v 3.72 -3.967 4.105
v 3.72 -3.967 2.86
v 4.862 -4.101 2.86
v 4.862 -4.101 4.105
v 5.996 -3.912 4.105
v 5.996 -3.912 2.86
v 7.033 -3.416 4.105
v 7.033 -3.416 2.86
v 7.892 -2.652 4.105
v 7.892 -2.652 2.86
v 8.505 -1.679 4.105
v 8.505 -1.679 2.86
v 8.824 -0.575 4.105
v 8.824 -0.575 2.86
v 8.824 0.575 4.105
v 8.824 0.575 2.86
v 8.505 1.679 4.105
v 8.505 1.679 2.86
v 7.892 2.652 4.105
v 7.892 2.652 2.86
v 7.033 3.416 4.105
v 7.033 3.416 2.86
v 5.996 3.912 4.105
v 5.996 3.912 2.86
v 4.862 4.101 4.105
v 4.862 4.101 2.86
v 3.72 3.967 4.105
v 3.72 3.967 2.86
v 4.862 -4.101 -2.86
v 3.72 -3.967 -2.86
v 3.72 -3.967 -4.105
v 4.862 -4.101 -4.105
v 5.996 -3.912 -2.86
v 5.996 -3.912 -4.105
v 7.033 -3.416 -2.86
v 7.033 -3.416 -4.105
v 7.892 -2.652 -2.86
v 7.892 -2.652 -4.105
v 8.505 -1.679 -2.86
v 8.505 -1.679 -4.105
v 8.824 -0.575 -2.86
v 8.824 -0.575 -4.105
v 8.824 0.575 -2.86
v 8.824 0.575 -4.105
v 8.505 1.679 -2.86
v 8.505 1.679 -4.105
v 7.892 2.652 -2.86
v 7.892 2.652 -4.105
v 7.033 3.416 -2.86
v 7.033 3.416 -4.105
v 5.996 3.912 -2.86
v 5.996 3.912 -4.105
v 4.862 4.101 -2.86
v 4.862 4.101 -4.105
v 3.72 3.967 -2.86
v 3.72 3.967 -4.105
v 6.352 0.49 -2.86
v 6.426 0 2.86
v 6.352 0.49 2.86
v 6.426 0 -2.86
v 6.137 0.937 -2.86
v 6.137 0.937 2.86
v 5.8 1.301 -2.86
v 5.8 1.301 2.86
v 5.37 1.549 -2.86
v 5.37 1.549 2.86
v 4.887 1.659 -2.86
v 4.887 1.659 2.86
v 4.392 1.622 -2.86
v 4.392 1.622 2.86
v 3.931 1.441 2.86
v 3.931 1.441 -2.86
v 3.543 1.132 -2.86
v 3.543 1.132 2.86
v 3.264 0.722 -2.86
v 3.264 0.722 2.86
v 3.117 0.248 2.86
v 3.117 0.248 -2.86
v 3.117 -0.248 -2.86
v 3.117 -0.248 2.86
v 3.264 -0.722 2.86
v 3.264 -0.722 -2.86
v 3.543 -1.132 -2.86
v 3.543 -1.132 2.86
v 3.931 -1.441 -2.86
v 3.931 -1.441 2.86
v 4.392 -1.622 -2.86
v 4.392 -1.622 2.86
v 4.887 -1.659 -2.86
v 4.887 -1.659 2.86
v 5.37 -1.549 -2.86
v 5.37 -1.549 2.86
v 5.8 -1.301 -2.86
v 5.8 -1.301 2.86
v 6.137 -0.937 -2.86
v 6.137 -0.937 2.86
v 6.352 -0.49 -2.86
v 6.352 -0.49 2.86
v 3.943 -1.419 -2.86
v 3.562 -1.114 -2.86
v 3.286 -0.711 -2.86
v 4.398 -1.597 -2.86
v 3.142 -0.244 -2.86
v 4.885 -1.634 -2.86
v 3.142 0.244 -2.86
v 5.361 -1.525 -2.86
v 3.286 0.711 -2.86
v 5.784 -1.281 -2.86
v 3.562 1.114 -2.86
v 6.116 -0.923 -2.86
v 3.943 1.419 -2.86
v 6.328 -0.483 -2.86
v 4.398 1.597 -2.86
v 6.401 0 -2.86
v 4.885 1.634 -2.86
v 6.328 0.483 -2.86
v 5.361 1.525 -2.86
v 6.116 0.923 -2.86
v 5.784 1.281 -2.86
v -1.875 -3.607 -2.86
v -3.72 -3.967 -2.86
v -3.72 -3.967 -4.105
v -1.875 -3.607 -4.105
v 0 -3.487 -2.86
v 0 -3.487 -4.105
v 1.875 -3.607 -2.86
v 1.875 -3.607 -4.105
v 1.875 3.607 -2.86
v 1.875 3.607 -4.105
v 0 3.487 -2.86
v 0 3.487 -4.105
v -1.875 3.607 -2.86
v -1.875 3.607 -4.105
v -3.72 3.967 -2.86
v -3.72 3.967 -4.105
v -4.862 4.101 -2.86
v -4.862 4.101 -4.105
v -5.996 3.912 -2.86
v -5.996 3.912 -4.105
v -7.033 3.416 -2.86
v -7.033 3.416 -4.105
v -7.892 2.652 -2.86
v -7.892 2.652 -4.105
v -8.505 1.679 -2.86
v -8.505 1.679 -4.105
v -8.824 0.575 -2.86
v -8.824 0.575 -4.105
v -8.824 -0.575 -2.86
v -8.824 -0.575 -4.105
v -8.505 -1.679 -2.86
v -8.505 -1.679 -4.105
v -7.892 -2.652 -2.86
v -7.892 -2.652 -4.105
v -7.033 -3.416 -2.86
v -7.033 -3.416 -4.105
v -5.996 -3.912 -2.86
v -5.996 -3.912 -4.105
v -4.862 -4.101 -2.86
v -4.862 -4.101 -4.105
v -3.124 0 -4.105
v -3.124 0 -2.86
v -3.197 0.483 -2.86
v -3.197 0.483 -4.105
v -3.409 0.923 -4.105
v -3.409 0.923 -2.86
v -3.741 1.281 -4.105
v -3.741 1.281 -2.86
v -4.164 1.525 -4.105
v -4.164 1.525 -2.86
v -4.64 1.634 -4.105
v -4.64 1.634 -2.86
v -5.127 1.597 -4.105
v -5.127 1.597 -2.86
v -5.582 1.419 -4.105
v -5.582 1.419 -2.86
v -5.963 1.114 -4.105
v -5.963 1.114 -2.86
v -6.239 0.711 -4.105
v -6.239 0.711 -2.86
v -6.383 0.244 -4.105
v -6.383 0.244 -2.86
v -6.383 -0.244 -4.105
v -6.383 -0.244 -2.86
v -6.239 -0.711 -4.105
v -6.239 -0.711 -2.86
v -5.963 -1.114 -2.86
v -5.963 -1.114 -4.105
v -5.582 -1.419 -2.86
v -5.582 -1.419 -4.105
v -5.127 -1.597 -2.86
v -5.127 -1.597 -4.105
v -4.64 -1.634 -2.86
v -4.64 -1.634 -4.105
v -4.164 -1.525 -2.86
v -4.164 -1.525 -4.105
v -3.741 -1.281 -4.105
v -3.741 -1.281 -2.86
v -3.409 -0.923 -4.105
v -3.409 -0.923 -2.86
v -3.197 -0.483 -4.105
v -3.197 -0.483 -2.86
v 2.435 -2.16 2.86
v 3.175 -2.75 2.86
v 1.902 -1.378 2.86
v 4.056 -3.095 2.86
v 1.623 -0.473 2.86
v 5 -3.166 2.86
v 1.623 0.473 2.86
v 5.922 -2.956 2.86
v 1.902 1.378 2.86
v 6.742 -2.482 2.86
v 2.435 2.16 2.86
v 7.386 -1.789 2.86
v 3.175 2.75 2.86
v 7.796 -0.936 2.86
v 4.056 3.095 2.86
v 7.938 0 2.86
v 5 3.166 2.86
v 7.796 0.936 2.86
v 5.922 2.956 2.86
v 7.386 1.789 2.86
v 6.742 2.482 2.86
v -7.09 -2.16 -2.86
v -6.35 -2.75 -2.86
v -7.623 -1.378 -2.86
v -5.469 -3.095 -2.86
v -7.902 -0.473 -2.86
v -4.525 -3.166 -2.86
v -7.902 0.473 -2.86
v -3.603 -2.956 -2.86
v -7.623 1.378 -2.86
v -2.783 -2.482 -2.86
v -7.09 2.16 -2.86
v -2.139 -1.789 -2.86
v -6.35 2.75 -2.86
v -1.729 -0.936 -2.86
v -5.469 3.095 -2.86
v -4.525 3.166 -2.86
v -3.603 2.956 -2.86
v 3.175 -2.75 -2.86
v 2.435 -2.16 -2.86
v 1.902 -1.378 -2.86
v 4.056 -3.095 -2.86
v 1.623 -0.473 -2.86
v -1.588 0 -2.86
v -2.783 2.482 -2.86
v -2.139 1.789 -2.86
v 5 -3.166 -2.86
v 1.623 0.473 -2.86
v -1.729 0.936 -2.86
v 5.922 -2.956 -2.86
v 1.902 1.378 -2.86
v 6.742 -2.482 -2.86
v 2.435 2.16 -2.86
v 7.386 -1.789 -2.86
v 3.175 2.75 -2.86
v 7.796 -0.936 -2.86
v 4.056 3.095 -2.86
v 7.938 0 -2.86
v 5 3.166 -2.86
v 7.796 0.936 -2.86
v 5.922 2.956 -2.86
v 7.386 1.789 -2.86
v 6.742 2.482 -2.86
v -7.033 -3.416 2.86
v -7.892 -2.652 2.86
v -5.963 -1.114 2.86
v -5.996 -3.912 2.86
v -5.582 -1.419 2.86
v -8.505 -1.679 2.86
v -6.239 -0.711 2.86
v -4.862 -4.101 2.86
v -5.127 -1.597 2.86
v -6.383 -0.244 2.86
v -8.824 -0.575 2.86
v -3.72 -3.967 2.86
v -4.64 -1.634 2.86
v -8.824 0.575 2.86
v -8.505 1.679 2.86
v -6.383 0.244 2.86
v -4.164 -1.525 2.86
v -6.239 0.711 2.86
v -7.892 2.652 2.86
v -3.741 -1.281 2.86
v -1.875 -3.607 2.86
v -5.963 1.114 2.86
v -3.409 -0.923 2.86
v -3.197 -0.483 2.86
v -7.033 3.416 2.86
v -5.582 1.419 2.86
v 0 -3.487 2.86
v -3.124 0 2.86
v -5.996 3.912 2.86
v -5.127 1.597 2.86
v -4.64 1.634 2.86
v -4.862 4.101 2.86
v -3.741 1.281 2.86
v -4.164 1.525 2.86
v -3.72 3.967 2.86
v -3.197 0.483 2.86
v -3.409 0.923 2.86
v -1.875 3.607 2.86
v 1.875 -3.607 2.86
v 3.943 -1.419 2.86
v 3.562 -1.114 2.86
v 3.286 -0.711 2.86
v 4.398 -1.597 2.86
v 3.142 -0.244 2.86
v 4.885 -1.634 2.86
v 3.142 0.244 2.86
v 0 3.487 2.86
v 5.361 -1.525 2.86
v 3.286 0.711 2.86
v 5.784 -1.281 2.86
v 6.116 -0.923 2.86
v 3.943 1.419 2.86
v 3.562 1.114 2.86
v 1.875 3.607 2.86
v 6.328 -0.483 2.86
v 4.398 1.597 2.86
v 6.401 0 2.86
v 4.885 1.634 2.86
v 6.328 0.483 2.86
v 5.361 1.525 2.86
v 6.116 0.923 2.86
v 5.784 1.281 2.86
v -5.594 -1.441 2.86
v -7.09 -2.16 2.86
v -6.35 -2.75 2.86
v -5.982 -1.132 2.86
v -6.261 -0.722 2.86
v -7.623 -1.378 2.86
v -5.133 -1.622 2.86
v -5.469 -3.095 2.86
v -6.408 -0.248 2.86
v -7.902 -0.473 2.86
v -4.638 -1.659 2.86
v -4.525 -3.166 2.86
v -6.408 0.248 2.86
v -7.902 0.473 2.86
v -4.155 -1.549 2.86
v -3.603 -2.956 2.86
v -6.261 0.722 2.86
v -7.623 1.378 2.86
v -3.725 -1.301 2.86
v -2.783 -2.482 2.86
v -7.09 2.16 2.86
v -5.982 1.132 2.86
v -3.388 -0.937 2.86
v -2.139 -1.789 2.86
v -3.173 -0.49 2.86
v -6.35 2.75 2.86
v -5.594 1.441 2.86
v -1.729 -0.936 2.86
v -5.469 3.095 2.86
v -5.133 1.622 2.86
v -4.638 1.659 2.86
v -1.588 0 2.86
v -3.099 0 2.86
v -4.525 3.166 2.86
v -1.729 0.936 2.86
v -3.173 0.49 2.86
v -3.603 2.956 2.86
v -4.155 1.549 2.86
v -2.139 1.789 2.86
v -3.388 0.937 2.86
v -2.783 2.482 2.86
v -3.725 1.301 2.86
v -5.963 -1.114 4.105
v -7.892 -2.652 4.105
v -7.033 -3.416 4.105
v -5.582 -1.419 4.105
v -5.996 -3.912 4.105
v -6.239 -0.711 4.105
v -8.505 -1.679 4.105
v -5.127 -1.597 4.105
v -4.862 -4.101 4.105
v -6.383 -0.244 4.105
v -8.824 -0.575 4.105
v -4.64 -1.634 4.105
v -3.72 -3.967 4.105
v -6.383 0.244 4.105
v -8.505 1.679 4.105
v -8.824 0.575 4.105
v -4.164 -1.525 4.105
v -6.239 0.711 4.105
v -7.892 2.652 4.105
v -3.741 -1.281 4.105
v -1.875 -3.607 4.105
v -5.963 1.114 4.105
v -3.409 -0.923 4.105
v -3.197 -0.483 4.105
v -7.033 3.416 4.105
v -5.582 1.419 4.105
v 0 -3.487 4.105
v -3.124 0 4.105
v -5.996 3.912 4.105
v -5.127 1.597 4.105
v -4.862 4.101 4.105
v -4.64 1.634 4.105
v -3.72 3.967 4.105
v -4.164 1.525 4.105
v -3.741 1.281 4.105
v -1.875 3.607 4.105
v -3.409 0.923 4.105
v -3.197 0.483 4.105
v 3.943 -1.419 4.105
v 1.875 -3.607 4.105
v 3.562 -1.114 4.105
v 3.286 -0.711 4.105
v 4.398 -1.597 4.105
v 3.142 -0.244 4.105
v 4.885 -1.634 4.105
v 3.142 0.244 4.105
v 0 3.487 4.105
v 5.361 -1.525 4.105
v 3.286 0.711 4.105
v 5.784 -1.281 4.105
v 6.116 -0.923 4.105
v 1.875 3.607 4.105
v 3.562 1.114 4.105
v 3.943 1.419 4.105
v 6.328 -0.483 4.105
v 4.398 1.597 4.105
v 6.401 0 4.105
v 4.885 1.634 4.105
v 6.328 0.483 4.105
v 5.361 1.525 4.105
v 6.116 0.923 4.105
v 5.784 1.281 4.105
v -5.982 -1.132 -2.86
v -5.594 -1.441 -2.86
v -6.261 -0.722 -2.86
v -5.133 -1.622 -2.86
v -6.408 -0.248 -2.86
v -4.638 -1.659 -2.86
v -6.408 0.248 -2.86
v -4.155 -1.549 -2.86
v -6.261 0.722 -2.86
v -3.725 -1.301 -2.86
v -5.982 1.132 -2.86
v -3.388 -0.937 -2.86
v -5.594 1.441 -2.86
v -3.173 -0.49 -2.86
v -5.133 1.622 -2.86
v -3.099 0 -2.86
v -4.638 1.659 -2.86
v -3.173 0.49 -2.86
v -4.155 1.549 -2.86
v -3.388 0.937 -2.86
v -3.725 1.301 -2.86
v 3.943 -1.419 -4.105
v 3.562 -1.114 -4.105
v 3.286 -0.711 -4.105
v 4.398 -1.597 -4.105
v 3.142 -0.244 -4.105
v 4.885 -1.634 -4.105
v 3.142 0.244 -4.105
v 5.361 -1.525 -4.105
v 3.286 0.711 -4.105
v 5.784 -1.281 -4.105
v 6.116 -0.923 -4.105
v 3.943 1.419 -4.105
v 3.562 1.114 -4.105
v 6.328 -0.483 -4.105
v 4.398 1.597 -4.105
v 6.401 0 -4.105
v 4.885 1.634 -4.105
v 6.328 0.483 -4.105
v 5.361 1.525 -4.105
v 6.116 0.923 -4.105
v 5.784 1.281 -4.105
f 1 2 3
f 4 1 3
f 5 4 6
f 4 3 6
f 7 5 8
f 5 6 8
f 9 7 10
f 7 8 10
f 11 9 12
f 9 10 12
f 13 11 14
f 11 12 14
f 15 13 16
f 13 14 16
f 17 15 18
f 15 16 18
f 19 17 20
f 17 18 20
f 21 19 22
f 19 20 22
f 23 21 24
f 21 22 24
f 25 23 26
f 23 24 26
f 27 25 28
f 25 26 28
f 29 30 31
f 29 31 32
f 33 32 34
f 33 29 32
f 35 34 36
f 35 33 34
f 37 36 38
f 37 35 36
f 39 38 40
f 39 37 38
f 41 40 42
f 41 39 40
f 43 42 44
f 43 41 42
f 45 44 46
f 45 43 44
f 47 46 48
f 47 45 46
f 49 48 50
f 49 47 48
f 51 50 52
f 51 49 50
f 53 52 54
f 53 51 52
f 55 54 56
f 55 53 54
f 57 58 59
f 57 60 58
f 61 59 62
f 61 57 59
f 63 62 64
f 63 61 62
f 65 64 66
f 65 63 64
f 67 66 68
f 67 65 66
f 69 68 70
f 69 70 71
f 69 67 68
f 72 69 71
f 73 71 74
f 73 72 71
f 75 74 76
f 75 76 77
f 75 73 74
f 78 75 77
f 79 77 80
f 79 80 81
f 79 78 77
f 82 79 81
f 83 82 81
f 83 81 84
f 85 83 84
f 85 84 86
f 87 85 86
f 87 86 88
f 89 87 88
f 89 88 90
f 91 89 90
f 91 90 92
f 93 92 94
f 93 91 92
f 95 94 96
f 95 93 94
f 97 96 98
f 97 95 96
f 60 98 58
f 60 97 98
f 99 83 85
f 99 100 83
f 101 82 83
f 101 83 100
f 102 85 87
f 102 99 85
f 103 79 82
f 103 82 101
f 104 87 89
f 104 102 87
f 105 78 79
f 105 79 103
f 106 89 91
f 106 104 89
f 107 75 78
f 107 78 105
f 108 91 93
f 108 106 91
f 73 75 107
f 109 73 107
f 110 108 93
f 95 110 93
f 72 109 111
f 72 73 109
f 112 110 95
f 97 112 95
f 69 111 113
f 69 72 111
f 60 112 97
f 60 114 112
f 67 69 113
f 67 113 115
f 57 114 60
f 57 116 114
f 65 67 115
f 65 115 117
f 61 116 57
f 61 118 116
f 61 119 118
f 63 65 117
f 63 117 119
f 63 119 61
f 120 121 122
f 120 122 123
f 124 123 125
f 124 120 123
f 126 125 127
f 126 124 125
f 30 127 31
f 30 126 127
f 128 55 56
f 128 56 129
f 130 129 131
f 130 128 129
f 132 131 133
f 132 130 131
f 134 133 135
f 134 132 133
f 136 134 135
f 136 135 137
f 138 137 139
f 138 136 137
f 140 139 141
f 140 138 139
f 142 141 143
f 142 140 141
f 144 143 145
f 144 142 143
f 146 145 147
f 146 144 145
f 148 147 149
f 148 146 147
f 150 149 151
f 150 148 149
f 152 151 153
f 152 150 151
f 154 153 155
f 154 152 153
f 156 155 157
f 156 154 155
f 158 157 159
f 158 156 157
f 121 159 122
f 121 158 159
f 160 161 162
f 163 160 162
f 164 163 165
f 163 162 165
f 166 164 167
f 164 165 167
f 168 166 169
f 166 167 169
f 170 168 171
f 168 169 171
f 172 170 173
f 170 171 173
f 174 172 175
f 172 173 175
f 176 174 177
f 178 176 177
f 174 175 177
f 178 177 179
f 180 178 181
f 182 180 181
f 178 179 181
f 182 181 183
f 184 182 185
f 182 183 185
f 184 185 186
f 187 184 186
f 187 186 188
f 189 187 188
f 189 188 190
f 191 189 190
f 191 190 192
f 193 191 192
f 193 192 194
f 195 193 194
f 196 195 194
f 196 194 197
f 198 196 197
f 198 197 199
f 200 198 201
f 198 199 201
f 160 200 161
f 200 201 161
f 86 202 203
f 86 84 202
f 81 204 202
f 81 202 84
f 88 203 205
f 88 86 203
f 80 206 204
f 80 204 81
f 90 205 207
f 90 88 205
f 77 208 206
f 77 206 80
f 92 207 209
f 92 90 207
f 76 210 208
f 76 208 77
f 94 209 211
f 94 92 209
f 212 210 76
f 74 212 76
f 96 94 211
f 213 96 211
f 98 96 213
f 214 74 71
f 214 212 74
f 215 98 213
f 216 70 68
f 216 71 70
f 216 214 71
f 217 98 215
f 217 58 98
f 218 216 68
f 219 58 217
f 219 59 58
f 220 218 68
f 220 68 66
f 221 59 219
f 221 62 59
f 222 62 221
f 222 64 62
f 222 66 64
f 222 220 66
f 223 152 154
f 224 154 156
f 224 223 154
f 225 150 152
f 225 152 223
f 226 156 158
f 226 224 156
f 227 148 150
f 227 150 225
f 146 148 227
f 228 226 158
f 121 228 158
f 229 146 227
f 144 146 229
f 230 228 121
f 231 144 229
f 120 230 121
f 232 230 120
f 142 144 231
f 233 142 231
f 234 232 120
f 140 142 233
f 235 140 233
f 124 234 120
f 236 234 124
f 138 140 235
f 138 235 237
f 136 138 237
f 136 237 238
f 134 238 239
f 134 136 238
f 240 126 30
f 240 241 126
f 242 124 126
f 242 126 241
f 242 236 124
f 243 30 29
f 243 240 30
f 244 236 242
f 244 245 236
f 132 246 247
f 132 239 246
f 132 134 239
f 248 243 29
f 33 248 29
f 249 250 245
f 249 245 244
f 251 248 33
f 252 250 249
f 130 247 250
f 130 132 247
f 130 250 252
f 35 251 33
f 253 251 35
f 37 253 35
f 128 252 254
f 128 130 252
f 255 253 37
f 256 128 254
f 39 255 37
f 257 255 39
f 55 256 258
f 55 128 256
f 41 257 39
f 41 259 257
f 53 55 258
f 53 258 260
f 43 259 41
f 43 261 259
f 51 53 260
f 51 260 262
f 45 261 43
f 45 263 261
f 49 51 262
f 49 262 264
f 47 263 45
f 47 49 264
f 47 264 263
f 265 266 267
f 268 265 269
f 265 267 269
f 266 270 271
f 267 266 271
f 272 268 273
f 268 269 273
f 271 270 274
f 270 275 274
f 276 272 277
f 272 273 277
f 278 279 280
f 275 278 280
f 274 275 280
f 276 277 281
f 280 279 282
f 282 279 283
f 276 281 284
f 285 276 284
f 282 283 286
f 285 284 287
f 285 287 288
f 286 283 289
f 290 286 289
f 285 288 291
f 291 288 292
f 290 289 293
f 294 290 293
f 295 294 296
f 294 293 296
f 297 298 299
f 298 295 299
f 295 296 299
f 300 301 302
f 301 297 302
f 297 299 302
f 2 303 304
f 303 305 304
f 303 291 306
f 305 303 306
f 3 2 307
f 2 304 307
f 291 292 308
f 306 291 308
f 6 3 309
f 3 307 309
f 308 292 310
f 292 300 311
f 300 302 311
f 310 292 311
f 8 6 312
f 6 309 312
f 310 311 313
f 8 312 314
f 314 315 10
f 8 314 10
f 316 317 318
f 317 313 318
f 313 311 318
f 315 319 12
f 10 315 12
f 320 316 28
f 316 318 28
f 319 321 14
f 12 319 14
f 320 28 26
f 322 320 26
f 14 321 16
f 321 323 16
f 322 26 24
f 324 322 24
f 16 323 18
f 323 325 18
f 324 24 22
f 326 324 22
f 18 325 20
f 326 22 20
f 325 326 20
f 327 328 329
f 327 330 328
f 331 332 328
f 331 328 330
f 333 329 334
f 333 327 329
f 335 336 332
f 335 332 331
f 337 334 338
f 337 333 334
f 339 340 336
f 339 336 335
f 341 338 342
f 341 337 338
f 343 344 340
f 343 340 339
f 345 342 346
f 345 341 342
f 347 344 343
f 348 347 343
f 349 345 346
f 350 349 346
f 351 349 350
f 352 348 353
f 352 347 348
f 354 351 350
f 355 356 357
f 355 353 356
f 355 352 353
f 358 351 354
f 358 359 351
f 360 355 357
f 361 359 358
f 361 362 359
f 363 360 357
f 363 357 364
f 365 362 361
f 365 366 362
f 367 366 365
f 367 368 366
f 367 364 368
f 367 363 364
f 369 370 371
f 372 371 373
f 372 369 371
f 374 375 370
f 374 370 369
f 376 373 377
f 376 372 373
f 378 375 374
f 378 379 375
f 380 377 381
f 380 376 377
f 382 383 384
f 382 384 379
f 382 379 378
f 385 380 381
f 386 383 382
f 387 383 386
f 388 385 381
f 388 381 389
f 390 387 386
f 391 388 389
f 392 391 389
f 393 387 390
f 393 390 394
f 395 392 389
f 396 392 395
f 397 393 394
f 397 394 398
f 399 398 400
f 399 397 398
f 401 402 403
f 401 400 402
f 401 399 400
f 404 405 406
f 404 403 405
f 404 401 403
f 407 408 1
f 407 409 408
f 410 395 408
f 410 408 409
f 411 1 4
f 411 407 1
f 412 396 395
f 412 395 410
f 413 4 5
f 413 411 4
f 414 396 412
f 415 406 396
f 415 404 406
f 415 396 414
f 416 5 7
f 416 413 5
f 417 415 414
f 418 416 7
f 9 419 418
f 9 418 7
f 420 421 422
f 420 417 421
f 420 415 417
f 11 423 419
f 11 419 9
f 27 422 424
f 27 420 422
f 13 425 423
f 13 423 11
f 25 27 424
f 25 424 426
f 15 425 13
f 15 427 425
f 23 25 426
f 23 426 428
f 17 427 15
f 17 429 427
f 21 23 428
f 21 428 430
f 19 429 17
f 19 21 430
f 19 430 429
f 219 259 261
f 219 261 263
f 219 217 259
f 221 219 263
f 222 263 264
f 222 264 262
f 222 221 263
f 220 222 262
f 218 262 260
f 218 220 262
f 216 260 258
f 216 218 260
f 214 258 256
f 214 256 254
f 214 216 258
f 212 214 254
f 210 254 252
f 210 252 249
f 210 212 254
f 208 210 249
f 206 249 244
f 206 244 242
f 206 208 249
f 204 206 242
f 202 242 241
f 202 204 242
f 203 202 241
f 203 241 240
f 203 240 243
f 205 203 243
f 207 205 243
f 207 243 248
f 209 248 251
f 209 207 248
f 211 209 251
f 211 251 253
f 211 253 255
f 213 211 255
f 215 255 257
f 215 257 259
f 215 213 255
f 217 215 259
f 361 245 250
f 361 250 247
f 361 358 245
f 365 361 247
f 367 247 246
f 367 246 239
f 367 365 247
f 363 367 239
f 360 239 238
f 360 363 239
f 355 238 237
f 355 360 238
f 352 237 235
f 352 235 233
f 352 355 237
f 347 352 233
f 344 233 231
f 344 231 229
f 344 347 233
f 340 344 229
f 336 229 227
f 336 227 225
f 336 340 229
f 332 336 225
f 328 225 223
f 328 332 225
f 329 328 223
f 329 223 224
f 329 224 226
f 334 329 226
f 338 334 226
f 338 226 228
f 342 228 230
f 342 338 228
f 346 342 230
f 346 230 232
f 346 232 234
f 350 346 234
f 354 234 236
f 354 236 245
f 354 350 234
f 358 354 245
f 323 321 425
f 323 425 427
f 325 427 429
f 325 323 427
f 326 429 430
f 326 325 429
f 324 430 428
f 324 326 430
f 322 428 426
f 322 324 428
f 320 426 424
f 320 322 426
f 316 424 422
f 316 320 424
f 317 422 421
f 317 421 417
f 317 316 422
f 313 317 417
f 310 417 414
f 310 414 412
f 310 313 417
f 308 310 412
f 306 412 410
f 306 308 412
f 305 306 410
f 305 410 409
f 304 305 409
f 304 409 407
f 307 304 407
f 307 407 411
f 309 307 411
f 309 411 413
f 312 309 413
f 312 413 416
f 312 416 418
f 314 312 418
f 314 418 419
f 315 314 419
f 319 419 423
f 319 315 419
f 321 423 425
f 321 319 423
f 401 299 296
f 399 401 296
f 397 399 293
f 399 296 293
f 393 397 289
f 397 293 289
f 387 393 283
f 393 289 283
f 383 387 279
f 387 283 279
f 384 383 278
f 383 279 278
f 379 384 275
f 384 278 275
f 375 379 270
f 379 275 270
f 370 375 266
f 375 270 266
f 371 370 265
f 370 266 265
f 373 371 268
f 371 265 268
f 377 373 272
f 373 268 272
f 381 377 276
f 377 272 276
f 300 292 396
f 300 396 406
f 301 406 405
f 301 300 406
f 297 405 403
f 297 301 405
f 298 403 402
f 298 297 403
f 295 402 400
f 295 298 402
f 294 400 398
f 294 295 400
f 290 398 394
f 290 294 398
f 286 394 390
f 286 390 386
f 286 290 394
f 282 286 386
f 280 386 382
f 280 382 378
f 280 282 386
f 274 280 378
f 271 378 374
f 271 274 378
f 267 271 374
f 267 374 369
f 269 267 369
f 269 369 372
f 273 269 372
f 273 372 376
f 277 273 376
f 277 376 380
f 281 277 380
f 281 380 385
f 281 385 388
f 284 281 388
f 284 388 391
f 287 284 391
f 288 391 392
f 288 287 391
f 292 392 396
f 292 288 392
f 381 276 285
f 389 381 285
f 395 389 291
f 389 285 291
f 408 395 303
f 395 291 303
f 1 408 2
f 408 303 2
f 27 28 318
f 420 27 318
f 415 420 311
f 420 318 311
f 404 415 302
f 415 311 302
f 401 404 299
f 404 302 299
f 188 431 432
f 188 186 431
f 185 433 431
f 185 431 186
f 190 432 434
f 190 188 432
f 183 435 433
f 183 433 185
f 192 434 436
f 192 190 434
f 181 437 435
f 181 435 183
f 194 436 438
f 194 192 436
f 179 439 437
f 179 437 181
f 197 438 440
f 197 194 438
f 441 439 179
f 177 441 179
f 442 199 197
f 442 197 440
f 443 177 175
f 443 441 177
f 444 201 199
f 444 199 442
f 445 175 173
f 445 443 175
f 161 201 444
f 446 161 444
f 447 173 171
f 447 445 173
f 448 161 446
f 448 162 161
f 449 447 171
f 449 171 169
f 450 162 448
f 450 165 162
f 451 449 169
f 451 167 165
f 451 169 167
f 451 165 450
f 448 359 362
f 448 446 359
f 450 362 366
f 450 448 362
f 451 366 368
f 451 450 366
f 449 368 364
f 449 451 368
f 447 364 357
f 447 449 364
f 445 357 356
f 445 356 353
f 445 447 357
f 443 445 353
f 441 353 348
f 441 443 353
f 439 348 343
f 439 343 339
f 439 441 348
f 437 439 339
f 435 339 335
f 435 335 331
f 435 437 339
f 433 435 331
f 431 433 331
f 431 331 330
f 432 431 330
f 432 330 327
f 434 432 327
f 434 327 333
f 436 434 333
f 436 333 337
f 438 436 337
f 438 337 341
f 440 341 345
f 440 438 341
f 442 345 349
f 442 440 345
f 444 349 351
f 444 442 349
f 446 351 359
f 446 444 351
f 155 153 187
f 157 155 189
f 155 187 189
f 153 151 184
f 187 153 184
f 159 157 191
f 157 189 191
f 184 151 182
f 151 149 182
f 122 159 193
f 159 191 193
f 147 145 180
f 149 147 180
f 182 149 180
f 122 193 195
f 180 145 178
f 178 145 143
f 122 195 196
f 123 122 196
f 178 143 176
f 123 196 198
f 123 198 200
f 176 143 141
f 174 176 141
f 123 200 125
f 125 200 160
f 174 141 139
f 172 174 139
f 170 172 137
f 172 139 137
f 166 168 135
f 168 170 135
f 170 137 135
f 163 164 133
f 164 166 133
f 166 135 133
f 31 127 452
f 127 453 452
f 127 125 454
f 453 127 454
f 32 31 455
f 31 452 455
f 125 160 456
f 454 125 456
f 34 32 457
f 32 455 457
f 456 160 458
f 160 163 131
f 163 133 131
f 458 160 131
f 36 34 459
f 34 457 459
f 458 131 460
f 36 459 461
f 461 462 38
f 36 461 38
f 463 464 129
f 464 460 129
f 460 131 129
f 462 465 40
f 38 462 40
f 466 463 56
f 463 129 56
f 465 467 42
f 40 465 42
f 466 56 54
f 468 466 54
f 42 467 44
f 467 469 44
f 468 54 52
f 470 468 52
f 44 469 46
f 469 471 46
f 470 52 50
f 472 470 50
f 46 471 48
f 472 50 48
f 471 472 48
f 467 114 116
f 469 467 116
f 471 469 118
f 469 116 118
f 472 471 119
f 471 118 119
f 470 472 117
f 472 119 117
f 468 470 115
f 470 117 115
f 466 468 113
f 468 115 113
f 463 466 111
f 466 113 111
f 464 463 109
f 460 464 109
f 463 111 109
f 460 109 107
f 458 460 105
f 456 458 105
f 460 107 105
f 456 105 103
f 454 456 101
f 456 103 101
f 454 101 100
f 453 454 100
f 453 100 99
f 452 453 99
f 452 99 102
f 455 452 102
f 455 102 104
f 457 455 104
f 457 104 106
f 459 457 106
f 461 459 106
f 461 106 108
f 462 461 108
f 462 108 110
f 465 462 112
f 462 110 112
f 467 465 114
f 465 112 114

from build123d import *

# Parameters (mm, degrees)
SKETCH4_R             = 3.175
SKETCH4_R_2           = 1.6637
BOSS_EXTRUDE1_DEPTH   = 2.86
BOSS_EXTRUDE1_2_DEPTH = 2.86
SKETCH5_R             = 1.6383
BOSS_EXTRUDE2_DEPTH   = 1.2446


with BuildPart() as part:
    # Sketch4 → Boss-Extrude1 (new, symmetric)
    with BuildSketch(Plane.XY):
        with Locations((-4.7625, 0)):
            Circle(SKETCH4_R)
        with Locations((-4.7625, 0)):
            Circle(SKETCH4_R_2, mode=Mode.SUBTRACT)
    extrude(amount=BOSS_EXTRUDE1_DEPTH, both=True)


with BuildPart() as body_2:
    # Sketch4 → Boss-Extrude1 2 (new, symmetric)
    with BuildSketch(Plane.XY):
        with Locations((4.7625, 0)):
            Circle(SKETCH4_R)
        with Locations((4.7625, 0)):
            Circle(SKETCH4_R_2, mode=Mode.SUBTRACT)
    extrude(amount=BOSS_EXTRUDE1_2_DEPTH, both=True)


with BuildPart() as body_3:
    # Sketch5 → Boss-Extrude2 (new body)
    with BuildSketch(Plane.XY.offset(2.86)):
        with BuildLine():
            ThreePointArc((-3.71992076, 3.967398762), (-8.8646, 0), (-3.71992076, -3.967398762))
            ThreePointArc((-3.71992076, -3.967398762), (0, -3.486785), (3.71992076, -3.967398762))
            ThreePointArc((3.71992076, -3.967398762), (8.8646, 0), (3.71992076, 3.967398762))
            ThreePointArc((3.71992076, 3.967398762), (0, 3.486785), (-3.71992076, 3.967398762))
        make_face()
        with Locations((-4.7625, 0)):
            Circle(SKETCH5_R, mode=Mode.SUBTRACT)
        with Locations((4.7625, 0)):
            Circle(SKETCH5_R, mode=Mode.SUBTRACT)
    boss_extrude2 = extrude(amount=BOSS_EXTRUDE2_DEPTH)


with BuildPart() as part_1:
    add(part.part)

    add(body_2.part)  # Mirror2 merges body 2
    # Mirror2: Boss-Extrude2 across plane
    add(boss_extrude2.mirror(Plane.XY))


solid = Compound([body_3.part, part_1.part])
